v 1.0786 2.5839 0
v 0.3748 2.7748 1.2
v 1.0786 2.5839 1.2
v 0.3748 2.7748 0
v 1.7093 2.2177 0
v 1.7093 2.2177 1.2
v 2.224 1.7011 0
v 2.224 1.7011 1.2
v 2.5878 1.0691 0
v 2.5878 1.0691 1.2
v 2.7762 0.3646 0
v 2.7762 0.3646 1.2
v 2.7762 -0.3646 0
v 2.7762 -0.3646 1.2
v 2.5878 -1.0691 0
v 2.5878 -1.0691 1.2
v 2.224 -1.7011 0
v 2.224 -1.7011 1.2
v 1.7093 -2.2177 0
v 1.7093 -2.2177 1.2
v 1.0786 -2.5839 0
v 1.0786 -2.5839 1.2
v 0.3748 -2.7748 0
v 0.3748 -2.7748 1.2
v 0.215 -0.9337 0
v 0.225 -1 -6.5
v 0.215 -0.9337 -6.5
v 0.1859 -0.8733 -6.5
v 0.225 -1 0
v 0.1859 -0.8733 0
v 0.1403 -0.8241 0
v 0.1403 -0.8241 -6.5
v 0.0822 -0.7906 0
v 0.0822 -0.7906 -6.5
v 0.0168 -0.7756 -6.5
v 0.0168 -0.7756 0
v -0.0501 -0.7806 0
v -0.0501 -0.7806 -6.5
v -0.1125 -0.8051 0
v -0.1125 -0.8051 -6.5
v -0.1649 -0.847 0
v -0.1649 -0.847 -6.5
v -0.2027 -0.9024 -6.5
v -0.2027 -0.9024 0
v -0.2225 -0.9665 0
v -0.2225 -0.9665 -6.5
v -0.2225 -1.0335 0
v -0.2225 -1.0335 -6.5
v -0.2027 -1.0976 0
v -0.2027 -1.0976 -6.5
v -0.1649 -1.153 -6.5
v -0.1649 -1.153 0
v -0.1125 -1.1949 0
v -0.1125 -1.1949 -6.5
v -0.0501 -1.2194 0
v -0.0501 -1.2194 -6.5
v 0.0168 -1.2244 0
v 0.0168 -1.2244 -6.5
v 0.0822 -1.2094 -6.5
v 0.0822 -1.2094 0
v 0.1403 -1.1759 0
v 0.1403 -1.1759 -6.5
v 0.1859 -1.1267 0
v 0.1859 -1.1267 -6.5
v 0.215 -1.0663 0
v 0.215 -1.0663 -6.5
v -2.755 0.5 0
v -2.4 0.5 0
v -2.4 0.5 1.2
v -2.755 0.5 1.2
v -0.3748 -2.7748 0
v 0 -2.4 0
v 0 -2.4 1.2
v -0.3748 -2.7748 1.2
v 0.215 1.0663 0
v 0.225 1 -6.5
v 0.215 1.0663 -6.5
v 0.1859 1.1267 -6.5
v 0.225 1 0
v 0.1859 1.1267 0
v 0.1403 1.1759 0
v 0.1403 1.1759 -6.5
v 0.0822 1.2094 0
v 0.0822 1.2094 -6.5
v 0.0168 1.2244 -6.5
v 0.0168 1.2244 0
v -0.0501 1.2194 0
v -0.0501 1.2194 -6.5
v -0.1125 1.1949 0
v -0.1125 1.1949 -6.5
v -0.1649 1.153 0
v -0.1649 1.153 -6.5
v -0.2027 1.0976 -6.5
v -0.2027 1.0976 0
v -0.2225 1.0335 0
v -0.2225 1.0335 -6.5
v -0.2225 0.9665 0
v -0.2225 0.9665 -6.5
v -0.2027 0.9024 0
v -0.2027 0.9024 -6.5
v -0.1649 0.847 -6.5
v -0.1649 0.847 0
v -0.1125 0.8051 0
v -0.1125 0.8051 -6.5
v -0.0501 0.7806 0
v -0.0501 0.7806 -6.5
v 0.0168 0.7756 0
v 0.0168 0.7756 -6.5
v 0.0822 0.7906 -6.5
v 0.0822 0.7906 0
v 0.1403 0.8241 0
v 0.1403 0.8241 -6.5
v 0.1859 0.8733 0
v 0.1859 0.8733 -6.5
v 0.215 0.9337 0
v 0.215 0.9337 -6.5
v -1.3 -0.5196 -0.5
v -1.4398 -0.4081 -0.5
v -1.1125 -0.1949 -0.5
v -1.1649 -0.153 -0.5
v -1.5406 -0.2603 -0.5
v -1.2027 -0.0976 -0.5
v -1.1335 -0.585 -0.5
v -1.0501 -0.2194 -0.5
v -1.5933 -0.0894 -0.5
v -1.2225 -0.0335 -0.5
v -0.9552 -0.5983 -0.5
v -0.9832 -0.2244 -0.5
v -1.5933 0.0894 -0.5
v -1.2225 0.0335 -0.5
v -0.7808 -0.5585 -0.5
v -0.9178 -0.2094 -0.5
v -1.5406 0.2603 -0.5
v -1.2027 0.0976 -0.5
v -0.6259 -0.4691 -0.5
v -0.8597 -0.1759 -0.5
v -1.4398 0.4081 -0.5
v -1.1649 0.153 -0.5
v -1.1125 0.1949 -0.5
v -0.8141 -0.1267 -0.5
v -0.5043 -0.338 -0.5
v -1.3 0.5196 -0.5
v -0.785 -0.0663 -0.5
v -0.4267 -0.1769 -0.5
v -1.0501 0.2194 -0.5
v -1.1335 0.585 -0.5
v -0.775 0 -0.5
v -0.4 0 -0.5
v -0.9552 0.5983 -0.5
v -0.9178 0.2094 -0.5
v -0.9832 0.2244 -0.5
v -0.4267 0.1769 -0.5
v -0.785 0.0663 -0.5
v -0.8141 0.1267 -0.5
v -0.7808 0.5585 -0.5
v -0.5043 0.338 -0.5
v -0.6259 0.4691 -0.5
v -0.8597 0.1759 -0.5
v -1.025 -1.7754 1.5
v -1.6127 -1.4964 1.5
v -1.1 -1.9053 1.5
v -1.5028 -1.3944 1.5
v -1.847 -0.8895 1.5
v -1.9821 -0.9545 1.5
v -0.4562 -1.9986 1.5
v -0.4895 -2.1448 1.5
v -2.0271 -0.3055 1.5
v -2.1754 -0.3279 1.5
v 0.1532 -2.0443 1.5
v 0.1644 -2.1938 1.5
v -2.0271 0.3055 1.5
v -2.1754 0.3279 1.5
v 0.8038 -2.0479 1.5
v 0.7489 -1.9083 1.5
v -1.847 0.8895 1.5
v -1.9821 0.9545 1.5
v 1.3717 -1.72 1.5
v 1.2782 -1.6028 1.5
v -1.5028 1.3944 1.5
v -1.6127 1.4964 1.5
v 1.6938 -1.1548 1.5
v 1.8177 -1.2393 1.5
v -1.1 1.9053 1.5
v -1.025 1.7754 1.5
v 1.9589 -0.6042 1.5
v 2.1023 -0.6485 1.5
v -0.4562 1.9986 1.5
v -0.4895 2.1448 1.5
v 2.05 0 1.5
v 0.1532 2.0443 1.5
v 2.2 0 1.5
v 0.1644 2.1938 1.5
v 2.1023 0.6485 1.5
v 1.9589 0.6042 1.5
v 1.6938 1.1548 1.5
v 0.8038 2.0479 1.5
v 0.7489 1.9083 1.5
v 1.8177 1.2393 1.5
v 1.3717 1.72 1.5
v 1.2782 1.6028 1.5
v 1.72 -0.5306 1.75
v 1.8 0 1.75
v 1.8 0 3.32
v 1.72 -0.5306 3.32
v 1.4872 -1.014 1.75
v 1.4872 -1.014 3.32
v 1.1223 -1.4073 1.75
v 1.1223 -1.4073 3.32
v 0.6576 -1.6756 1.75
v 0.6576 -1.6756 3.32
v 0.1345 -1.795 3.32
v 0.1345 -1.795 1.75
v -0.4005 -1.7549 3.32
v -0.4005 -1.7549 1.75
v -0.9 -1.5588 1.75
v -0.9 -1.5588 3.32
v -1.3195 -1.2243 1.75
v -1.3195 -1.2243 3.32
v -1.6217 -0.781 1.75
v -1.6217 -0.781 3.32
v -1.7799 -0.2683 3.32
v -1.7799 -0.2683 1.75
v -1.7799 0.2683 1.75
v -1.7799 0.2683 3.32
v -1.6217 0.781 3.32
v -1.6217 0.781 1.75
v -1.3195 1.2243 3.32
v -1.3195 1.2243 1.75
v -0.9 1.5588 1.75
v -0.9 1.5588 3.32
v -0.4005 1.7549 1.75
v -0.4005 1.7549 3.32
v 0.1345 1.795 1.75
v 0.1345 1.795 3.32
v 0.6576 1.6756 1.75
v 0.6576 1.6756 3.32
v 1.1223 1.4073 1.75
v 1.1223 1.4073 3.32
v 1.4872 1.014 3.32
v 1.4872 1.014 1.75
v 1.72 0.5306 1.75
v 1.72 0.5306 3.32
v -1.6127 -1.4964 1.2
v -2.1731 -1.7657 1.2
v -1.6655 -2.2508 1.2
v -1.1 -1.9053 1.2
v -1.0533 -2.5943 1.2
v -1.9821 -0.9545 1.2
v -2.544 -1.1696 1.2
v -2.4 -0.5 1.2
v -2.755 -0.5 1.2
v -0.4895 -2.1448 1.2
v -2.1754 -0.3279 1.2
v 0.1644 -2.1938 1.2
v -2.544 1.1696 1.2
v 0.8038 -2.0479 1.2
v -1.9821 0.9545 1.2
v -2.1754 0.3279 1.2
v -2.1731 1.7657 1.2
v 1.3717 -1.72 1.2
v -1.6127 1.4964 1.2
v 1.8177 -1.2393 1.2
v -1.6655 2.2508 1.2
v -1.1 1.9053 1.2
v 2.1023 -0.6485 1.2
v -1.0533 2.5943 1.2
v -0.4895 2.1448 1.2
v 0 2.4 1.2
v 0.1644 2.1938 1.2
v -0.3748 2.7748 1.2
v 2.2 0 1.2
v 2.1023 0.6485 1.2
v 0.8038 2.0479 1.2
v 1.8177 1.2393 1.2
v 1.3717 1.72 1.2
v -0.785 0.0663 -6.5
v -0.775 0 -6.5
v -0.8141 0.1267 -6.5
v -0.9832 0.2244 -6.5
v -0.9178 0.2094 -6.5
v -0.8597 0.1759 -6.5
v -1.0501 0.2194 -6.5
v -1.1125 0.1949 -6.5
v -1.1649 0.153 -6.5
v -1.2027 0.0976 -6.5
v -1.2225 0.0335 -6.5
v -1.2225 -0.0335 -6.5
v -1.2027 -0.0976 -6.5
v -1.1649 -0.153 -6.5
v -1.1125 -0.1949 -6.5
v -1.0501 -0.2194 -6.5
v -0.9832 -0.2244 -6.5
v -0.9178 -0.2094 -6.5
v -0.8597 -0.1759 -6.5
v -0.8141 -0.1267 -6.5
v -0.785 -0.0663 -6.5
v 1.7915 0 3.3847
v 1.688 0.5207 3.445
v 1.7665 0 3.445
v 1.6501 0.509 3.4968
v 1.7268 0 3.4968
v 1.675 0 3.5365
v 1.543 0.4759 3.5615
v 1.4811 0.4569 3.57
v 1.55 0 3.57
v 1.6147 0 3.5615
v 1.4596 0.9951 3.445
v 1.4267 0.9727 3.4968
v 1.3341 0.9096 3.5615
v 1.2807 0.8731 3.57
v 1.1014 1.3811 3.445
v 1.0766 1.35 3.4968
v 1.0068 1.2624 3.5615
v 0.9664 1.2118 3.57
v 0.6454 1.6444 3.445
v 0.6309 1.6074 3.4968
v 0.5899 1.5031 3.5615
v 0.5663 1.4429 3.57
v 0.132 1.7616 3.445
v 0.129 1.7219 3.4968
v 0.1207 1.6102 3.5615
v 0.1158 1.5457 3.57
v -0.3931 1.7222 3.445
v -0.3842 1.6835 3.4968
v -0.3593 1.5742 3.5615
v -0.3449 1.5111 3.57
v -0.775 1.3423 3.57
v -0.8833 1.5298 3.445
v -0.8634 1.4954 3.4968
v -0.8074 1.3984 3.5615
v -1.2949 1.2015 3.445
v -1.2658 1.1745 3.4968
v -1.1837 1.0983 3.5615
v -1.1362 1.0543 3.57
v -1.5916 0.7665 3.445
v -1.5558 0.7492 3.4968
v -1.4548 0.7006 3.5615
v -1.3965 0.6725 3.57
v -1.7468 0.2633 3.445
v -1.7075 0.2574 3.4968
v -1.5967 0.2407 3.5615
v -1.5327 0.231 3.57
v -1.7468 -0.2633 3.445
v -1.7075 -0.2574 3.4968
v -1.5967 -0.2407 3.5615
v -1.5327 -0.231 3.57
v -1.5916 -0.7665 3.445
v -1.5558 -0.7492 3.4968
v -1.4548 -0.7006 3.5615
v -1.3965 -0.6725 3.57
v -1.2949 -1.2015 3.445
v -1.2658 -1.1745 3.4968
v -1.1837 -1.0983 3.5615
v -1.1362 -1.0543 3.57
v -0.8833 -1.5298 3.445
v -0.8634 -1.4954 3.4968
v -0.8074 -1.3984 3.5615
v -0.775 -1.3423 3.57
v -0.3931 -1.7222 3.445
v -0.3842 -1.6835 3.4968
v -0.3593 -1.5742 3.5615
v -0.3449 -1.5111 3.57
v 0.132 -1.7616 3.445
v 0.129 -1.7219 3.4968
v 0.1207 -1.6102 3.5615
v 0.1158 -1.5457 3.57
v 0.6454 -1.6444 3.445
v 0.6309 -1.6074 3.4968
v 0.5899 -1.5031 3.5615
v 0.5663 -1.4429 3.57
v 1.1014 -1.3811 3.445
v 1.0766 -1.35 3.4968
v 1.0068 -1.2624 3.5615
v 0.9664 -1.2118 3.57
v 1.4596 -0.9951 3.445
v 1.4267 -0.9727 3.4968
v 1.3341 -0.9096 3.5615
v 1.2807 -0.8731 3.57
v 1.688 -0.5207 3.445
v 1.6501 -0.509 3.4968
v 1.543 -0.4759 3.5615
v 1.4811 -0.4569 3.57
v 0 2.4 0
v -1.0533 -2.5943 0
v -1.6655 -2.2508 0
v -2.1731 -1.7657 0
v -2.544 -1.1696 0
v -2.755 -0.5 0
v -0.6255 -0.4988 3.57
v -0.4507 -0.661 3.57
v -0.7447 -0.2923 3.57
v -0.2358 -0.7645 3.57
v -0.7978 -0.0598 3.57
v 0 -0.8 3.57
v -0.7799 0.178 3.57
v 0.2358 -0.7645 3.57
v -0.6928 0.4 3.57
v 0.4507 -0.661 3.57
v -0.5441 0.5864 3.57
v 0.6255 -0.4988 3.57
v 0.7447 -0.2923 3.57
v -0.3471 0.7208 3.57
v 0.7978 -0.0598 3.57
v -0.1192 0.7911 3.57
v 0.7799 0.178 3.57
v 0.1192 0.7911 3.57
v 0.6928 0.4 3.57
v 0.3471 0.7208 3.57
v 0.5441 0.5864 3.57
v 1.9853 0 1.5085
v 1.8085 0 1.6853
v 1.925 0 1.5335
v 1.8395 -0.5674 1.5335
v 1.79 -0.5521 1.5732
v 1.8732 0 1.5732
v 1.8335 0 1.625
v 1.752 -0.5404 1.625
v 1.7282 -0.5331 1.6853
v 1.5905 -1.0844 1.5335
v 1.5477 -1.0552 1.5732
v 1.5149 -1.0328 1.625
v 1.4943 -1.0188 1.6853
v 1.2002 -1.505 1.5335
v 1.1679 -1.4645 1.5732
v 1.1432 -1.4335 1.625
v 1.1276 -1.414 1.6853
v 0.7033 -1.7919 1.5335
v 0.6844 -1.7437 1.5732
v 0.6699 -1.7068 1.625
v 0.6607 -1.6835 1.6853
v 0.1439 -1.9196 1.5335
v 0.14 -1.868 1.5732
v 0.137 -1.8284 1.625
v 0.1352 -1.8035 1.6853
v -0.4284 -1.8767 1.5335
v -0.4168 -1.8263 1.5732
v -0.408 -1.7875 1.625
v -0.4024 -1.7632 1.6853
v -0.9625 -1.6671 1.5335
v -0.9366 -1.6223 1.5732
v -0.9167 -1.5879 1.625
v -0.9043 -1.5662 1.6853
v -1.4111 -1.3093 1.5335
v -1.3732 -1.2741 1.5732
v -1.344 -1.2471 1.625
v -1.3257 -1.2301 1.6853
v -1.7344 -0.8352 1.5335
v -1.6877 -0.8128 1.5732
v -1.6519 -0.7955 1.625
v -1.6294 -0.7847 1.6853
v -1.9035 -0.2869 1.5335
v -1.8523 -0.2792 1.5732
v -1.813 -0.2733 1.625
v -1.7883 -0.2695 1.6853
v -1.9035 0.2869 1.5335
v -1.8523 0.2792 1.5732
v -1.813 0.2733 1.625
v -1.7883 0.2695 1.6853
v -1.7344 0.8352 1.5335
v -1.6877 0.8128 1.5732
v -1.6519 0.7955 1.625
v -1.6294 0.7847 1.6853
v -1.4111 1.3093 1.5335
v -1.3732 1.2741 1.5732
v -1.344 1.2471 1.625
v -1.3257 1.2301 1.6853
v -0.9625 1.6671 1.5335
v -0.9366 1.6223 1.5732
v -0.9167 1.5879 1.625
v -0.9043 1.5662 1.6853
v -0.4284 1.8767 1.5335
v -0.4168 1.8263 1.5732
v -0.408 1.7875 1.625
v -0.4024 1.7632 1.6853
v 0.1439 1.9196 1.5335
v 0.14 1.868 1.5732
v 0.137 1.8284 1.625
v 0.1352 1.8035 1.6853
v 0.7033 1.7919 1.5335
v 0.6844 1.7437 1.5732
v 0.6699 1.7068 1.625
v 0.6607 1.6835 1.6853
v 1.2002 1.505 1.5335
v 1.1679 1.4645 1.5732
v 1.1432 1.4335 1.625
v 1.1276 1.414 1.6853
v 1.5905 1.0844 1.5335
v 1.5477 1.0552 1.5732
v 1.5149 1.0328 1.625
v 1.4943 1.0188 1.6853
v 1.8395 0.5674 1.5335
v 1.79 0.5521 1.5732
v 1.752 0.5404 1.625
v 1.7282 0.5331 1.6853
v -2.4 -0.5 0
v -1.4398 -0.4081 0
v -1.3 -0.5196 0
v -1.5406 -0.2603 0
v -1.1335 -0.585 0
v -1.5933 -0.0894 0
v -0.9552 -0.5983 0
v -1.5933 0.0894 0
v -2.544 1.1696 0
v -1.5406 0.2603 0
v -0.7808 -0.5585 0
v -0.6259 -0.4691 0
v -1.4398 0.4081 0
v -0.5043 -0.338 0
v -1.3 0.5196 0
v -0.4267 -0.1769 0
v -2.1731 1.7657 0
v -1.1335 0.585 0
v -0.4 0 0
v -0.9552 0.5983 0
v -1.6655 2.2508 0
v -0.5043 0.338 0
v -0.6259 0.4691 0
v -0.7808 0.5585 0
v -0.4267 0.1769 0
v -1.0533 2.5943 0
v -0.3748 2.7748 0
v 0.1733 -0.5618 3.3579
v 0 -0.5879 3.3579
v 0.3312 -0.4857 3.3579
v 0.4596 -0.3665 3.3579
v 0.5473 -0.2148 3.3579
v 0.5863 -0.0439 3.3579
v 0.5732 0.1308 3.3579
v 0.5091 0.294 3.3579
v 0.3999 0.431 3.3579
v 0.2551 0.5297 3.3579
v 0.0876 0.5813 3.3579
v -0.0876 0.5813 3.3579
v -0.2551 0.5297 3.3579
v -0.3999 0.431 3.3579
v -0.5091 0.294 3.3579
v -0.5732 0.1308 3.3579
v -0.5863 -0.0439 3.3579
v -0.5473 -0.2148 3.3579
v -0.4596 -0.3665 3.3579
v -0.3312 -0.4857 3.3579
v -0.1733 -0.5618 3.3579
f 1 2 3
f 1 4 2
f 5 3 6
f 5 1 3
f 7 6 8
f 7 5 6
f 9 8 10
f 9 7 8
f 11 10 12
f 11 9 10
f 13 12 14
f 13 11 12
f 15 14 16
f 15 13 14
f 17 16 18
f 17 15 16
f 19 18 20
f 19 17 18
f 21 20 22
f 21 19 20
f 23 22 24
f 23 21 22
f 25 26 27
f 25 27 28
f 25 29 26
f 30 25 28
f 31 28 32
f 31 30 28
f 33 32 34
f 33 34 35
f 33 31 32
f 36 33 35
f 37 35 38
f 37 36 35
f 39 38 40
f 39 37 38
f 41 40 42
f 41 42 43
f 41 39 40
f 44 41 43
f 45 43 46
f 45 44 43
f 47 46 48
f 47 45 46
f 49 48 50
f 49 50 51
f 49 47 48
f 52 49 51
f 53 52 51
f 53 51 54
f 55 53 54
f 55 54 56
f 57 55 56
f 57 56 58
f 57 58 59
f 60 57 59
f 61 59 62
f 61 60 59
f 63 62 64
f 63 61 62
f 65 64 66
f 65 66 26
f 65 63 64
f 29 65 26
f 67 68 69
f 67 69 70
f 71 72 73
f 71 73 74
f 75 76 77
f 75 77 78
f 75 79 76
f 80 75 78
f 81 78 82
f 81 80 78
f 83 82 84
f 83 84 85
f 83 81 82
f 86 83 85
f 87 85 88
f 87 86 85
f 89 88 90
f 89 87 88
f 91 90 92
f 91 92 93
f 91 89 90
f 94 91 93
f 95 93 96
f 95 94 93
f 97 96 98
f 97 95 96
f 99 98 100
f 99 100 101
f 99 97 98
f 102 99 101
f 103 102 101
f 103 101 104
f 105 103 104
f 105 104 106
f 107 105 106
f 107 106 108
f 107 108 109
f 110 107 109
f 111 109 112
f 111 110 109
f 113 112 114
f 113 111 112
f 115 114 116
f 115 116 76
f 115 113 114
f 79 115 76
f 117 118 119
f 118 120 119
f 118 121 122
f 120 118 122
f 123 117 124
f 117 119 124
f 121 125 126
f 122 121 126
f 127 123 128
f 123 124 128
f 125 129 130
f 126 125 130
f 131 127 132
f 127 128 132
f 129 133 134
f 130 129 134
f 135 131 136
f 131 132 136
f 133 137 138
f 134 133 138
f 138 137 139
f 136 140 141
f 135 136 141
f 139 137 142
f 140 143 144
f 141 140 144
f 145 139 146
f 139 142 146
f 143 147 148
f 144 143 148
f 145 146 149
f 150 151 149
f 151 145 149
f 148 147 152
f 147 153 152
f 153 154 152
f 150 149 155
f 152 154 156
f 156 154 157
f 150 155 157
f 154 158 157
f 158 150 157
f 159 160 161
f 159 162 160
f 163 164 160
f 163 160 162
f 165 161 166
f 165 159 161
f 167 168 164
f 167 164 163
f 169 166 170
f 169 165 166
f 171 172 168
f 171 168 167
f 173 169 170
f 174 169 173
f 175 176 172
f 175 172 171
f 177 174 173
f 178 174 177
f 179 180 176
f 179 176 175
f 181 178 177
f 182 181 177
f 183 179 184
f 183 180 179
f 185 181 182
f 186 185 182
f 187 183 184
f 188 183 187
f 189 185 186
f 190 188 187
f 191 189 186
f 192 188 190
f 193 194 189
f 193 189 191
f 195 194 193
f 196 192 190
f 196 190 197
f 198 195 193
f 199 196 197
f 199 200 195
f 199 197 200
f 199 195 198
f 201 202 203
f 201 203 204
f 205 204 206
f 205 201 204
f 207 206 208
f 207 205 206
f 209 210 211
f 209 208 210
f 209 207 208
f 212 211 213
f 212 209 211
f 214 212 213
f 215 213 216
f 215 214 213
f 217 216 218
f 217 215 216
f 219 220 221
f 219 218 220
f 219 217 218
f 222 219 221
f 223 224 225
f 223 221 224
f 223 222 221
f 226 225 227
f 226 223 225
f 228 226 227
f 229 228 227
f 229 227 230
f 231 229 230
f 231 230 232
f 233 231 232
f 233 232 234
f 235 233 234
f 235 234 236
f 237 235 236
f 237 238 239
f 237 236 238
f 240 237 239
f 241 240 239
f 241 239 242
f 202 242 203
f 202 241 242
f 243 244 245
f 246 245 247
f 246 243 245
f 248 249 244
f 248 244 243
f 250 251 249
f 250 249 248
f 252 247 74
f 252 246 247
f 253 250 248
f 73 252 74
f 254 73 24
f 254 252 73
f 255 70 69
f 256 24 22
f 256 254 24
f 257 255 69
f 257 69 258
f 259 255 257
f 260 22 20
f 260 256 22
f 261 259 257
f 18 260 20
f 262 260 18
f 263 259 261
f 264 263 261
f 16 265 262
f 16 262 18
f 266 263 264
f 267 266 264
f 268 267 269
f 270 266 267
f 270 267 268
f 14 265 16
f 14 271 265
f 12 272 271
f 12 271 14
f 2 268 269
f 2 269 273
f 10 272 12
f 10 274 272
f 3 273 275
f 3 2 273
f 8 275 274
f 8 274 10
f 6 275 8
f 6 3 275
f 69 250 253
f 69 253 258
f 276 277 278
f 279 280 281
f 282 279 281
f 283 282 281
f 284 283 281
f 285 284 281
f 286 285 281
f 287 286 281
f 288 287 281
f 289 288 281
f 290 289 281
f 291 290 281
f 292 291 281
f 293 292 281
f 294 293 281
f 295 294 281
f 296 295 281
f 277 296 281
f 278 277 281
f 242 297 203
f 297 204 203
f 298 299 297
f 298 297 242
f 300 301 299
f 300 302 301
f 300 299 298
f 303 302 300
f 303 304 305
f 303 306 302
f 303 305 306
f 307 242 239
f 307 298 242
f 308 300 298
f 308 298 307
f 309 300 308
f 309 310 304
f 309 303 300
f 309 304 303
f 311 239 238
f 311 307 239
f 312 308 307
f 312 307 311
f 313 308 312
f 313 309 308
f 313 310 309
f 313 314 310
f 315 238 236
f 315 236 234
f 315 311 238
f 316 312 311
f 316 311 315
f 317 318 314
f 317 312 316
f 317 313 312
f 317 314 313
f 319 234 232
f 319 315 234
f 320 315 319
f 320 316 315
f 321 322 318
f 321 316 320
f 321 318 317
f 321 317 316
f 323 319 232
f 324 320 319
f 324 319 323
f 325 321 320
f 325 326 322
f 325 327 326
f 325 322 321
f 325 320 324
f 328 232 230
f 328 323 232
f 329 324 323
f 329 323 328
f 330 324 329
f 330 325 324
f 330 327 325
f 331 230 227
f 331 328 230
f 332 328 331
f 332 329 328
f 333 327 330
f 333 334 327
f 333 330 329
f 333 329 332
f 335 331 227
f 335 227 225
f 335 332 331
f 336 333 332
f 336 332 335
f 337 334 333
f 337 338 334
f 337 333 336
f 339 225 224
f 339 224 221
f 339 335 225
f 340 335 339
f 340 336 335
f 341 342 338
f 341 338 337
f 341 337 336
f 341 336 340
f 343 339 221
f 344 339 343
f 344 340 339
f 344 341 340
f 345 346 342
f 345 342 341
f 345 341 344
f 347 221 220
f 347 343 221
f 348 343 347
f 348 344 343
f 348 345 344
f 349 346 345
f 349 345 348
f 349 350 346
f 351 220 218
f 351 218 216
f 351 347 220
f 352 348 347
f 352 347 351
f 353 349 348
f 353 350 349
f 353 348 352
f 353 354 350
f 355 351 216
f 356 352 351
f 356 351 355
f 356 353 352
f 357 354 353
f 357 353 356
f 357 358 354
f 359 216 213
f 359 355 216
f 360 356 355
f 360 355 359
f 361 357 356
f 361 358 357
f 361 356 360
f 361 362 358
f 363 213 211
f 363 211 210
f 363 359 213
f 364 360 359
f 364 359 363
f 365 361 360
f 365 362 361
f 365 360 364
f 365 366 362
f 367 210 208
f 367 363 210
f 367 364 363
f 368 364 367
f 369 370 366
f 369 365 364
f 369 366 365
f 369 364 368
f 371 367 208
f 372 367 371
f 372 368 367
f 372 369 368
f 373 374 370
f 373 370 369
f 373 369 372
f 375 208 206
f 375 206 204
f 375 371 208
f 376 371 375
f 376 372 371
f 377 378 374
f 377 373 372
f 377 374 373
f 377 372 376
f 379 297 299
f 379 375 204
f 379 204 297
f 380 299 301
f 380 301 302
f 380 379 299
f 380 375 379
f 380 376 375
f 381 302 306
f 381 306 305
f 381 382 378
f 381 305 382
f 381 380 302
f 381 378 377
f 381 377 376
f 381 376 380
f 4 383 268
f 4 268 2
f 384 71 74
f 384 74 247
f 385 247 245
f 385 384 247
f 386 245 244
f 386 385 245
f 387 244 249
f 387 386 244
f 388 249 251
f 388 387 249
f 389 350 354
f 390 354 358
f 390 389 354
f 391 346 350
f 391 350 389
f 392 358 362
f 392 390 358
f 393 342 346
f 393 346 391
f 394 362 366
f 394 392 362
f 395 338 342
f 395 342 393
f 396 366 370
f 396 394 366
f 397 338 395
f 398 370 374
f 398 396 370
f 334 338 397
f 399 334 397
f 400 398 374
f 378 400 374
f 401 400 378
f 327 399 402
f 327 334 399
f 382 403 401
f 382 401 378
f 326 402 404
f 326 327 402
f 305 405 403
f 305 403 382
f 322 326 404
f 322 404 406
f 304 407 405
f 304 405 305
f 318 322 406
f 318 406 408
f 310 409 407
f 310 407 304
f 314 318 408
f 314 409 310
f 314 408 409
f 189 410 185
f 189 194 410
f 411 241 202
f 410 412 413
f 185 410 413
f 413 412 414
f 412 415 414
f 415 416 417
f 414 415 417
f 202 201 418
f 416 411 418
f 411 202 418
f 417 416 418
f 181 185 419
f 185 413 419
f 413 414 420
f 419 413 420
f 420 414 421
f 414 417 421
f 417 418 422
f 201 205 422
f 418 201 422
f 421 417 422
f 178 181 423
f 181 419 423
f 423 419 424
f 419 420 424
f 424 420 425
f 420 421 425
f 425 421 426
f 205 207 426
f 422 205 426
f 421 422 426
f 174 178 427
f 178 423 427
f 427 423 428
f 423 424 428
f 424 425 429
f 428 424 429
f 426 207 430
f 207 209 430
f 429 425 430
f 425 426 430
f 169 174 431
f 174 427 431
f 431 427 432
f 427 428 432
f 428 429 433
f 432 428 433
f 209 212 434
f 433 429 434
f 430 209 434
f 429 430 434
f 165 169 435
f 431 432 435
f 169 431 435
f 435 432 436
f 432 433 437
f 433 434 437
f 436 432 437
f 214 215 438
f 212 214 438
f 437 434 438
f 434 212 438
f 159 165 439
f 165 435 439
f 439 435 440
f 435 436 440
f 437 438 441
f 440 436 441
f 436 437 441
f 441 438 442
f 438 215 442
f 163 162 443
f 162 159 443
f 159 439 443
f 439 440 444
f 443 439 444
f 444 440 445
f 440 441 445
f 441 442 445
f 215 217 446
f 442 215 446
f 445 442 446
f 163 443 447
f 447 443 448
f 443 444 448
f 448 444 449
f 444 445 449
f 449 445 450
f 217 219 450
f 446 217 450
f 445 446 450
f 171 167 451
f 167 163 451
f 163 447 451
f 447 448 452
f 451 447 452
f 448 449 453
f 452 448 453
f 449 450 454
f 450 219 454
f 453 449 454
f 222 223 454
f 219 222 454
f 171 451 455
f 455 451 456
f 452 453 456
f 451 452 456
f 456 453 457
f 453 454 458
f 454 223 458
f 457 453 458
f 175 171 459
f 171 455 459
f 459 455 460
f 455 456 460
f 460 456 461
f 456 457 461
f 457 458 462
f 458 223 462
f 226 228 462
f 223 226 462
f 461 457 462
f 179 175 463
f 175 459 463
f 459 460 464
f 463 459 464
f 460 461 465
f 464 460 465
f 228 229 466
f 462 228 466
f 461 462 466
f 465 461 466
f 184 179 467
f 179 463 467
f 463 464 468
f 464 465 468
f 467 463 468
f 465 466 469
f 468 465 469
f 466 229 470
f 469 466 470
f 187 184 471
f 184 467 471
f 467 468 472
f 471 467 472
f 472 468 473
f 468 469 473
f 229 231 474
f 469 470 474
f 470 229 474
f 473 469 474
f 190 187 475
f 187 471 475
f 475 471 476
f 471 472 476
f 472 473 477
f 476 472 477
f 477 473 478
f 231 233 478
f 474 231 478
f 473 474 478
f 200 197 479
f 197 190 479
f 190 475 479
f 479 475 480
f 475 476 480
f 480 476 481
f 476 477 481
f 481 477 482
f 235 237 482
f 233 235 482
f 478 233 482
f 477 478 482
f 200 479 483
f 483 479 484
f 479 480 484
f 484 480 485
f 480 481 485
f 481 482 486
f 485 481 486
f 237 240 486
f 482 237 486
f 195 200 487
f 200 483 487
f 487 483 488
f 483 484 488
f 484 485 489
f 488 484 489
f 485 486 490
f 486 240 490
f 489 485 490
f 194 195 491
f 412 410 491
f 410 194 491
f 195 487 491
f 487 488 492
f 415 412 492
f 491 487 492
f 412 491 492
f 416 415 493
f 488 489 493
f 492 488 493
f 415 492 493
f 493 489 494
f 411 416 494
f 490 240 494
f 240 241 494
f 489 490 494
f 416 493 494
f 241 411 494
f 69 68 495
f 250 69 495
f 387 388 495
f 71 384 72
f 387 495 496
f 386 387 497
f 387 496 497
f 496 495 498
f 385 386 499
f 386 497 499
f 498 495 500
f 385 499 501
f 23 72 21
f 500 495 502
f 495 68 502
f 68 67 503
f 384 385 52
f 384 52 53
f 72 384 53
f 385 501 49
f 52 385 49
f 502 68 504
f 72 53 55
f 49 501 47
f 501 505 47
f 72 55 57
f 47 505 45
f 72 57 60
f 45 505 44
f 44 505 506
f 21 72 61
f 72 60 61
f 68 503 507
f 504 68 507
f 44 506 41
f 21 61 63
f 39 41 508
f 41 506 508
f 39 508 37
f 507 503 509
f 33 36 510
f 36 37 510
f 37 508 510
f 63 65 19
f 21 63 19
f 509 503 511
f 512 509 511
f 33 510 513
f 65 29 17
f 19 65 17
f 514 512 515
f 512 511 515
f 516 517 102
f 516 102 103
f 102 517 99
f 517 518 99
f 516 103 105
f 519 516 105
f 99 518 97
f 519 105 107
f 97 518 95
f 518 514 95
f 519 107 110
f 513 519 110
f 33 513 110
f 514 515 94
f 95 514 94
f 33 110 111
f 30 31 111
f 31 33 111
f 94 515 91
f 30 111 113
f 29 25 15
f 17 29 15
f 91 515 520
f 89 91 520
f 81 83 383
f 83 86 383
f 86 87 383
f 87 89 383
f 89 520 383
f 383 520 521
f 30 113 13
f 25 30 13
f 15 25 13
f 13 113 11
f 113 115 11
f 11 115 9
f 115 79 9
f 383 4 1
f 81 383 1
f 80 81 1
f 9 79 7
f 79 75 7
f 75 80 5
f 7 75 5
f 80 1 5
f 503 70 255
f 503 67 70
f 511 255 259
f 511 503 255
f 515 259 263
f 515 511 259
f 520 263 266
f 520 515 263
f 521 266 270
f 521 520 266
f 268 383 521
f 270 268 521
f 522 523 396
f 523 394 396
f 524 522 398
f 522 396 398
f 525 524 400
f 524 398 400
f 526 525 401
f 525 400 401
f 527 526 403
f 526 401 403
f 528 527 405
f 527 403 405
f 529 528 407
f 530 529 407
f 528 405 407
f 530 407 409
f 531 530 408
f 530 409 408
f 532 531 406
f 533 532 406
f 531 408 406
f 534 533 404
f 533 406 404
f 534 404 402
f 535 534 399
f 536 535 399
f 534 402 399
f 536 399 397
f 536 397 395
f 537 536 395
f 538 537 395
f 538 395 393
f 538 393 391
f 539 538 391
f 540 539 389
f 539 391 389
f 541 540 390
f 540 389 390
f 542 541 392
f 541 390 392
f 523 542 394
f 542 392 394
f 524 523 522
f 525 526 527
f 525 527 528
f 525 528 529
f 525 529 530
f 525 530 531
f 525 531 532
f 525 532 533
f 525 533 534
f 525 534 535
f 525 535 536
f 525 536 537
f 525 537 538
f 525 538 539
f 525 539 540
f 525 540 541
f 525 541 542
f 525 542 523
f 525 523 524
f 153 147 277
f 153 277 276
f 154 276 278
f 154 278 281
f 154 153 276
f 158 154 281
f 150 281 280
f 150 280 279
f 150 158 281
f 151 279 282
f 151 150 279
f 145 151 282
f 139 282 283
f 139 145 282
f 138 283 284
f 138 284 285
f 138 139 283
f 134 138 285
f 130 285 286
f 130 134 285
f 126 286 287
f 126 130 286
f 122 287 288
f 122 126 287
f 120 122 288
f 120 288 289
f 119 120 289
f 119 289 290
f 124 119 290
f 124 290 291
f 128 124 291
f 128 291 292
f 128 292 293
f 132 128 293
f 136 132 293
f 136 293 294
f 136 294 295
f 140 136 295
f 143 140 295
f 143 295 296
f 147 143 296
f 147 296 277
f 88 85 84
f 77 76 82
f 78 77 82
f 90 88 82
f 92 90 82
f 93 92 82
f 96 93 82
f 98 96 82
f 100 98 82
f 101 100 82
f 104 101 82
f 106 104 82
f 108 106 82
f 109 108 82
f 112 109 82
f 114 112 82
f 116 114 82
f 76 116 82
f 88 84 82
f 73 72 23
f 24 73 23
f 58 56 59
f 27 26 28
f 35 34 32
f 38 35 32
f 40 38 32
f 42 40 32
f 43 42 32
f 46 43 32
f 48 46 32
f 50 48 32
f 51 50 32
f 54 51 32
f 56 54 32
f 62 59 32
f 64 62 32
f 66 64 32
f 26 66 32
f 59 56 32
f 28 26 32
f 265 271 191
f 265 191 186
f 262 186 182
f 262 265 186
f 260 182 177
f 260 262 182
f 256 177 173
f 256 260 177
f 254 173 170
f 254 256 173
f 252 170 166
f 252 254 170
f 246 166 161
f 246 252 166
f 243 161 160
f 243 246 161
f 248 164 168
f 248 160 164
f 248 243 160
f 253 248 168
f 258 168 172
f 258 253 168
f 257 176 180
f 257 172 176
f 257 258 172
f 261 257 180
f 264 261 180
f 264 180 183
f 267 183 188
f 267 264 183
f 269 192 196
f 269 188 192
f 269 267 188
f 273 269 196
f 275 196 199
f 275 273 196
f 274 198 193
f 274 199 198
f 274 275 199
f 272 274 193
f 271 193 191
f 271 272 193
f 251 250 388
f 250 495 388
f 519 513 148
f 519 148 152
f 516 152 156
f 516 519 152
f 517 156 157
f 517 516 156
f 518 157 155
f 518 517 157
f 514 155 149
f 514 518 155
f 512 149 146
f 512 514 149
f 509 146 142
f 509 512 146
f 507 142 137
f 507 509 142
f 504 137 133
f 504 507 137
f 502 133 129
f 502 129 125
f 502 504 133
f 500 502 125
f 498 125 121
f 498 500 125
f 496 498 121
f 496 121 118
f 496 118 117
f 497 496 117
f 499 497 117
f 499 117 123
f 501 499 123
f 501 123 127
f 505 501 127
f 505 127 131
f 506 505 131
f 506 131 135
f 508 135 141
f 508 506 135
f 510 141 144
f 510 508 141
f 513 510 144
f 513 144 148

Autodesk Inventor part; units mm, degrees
ref_plane "YZ Plane" through (0, 0, 0) normal (1, 0, 0) x (0, 1, 0)
ref_plane "XZ Plane" through (0, 0, 0) normal (0, 1, 0) x (-1, 0, 0)
ref_plane "XY Plane" through (0, 0, 0) normal (0, 0, 1) x (1, 0, 0)
sketch "草图1" plane through (0, 0, 0) normal (0, 0, 1) x (1, 0, 0)
  circle A0 centre (0, 0) radius 2.8
  circle A1 centre (0, 0) radius 1 construction
  line L0 (0, 2.8) -> (0, 2.4)
  line L1 (0, 2.4) -> (0.3748, 2.7748)
  line L2 (0, 2.4) -> (-0.3748, 2.7748)
  line L3 (0, 2.4) -> (0.53, 2.4) construction
  line L4 (0, 0) -> (0, 2.8) construction
  line L5 (0, 0) -> (-2.8, 0) construction
  line L6 (0, 0) -> (0, -2.8) construction
  circle A2 centre (0, 1) radius 0.225
  circle A3 centre (0, -1) radius 0.225
  circle A4 centre (-1, 0) radius 0.225
  circle A5 centre (-1, 0) radius 0.6
  line L7 (0, -2.8) -> (0, -2.4)
  line L8 (0, -2.4) -> (0.3748, -2.7748)
  line L9 (0, -2.4) -> (-0.3748, -2.7748)
  line L10 (0, -2.4) -> (0.53, -2.4) construction
  line L11 (-2.4, 0) -> (-2.4, 0.5)
  line L12 (-2.4, 0.5) -> (-2.755, 0.5)
  line L13 (-2.4, 0) -> (-2.4, -0.5)
  line L14 (-2.4, -0.5) -> (-2.755, -0.5)
  point P0 (-0.3748, -2.7748)
  point P1 (0.3748, -2.7748)
  dimension "d0" = 5.6
  dimension "d1" = 2
  dimension "d5" = 0.4
  dimension "d6" = 45
  dimension "d7" = 135
  dimension "d8" = 0.45
  dimension "d9" = 0.45
  dimension "d10" = 0.45
  dimension "d11" = 1.2
  dimension "d12" = 0.5
  dimension "d13" = 0.5
  dimension "d14" = 0.4
extrude "拉伸1" add sketch "草图1" along normal blind 1.2 contours A0 L8 L9 L14 L13 L11 L12 L2 L1 | A2 | A3 | A4 | A5
extrude "拉伸2" add sketch "草图1" against normal blind 6.5 contours A2 | A3 | A4
extrude "拉伸3" add sketch "草图1" against normal blind 0.5 contours A5
sketch "草图2" plane through (0, 0, 1.2) normal (0, 0, 1) x (1, 0, 0)
  circle A0 centre (0, 0) radius 1.8
  circle A1 centre (0, 0) radius 2.2
  dimension "d21" = 3.6
  dimension "d22" = 4.4
extrude "拉伸4" add sketch "草图2" along normal blind 2.37 contours A0
extrude "拉伸5" add sketch "草图2" along normal blind 0.3
sketch "草图3" plane through (0, 0, 0) normal (1, 0, 0) x (0, 1, 0)
  line L0 (1.8, 3.57) -> (-1.8, 3.57) projected
  line L1 (0, 3.57) -> (-0.8, 3.57)
  line L2 (-0.8, 3.57) -> (-0.5879, 3.3579)
  line L3 (-0.5879, 3.3579) -> (0, 3.3579)
  line L4 (0, 3.3579) -> (0, 3.57)
  point P0 (0, 0)
  dimension "d27" = 0.8
  dimension "d28" = 0.3
  dimension "d29" = 45
revolve "旋转1" cut sketch "草图3" angle 360 about axis through (0, 0, 3.3579) along (0, 0, 1)
fillet "圆角1" radius 0.25 2 edges at (-1.8, 0, 3.57) (-1.8, 0, 1.5)
properties part number "CAN_φ5.6" material "黄铜，软黄"
